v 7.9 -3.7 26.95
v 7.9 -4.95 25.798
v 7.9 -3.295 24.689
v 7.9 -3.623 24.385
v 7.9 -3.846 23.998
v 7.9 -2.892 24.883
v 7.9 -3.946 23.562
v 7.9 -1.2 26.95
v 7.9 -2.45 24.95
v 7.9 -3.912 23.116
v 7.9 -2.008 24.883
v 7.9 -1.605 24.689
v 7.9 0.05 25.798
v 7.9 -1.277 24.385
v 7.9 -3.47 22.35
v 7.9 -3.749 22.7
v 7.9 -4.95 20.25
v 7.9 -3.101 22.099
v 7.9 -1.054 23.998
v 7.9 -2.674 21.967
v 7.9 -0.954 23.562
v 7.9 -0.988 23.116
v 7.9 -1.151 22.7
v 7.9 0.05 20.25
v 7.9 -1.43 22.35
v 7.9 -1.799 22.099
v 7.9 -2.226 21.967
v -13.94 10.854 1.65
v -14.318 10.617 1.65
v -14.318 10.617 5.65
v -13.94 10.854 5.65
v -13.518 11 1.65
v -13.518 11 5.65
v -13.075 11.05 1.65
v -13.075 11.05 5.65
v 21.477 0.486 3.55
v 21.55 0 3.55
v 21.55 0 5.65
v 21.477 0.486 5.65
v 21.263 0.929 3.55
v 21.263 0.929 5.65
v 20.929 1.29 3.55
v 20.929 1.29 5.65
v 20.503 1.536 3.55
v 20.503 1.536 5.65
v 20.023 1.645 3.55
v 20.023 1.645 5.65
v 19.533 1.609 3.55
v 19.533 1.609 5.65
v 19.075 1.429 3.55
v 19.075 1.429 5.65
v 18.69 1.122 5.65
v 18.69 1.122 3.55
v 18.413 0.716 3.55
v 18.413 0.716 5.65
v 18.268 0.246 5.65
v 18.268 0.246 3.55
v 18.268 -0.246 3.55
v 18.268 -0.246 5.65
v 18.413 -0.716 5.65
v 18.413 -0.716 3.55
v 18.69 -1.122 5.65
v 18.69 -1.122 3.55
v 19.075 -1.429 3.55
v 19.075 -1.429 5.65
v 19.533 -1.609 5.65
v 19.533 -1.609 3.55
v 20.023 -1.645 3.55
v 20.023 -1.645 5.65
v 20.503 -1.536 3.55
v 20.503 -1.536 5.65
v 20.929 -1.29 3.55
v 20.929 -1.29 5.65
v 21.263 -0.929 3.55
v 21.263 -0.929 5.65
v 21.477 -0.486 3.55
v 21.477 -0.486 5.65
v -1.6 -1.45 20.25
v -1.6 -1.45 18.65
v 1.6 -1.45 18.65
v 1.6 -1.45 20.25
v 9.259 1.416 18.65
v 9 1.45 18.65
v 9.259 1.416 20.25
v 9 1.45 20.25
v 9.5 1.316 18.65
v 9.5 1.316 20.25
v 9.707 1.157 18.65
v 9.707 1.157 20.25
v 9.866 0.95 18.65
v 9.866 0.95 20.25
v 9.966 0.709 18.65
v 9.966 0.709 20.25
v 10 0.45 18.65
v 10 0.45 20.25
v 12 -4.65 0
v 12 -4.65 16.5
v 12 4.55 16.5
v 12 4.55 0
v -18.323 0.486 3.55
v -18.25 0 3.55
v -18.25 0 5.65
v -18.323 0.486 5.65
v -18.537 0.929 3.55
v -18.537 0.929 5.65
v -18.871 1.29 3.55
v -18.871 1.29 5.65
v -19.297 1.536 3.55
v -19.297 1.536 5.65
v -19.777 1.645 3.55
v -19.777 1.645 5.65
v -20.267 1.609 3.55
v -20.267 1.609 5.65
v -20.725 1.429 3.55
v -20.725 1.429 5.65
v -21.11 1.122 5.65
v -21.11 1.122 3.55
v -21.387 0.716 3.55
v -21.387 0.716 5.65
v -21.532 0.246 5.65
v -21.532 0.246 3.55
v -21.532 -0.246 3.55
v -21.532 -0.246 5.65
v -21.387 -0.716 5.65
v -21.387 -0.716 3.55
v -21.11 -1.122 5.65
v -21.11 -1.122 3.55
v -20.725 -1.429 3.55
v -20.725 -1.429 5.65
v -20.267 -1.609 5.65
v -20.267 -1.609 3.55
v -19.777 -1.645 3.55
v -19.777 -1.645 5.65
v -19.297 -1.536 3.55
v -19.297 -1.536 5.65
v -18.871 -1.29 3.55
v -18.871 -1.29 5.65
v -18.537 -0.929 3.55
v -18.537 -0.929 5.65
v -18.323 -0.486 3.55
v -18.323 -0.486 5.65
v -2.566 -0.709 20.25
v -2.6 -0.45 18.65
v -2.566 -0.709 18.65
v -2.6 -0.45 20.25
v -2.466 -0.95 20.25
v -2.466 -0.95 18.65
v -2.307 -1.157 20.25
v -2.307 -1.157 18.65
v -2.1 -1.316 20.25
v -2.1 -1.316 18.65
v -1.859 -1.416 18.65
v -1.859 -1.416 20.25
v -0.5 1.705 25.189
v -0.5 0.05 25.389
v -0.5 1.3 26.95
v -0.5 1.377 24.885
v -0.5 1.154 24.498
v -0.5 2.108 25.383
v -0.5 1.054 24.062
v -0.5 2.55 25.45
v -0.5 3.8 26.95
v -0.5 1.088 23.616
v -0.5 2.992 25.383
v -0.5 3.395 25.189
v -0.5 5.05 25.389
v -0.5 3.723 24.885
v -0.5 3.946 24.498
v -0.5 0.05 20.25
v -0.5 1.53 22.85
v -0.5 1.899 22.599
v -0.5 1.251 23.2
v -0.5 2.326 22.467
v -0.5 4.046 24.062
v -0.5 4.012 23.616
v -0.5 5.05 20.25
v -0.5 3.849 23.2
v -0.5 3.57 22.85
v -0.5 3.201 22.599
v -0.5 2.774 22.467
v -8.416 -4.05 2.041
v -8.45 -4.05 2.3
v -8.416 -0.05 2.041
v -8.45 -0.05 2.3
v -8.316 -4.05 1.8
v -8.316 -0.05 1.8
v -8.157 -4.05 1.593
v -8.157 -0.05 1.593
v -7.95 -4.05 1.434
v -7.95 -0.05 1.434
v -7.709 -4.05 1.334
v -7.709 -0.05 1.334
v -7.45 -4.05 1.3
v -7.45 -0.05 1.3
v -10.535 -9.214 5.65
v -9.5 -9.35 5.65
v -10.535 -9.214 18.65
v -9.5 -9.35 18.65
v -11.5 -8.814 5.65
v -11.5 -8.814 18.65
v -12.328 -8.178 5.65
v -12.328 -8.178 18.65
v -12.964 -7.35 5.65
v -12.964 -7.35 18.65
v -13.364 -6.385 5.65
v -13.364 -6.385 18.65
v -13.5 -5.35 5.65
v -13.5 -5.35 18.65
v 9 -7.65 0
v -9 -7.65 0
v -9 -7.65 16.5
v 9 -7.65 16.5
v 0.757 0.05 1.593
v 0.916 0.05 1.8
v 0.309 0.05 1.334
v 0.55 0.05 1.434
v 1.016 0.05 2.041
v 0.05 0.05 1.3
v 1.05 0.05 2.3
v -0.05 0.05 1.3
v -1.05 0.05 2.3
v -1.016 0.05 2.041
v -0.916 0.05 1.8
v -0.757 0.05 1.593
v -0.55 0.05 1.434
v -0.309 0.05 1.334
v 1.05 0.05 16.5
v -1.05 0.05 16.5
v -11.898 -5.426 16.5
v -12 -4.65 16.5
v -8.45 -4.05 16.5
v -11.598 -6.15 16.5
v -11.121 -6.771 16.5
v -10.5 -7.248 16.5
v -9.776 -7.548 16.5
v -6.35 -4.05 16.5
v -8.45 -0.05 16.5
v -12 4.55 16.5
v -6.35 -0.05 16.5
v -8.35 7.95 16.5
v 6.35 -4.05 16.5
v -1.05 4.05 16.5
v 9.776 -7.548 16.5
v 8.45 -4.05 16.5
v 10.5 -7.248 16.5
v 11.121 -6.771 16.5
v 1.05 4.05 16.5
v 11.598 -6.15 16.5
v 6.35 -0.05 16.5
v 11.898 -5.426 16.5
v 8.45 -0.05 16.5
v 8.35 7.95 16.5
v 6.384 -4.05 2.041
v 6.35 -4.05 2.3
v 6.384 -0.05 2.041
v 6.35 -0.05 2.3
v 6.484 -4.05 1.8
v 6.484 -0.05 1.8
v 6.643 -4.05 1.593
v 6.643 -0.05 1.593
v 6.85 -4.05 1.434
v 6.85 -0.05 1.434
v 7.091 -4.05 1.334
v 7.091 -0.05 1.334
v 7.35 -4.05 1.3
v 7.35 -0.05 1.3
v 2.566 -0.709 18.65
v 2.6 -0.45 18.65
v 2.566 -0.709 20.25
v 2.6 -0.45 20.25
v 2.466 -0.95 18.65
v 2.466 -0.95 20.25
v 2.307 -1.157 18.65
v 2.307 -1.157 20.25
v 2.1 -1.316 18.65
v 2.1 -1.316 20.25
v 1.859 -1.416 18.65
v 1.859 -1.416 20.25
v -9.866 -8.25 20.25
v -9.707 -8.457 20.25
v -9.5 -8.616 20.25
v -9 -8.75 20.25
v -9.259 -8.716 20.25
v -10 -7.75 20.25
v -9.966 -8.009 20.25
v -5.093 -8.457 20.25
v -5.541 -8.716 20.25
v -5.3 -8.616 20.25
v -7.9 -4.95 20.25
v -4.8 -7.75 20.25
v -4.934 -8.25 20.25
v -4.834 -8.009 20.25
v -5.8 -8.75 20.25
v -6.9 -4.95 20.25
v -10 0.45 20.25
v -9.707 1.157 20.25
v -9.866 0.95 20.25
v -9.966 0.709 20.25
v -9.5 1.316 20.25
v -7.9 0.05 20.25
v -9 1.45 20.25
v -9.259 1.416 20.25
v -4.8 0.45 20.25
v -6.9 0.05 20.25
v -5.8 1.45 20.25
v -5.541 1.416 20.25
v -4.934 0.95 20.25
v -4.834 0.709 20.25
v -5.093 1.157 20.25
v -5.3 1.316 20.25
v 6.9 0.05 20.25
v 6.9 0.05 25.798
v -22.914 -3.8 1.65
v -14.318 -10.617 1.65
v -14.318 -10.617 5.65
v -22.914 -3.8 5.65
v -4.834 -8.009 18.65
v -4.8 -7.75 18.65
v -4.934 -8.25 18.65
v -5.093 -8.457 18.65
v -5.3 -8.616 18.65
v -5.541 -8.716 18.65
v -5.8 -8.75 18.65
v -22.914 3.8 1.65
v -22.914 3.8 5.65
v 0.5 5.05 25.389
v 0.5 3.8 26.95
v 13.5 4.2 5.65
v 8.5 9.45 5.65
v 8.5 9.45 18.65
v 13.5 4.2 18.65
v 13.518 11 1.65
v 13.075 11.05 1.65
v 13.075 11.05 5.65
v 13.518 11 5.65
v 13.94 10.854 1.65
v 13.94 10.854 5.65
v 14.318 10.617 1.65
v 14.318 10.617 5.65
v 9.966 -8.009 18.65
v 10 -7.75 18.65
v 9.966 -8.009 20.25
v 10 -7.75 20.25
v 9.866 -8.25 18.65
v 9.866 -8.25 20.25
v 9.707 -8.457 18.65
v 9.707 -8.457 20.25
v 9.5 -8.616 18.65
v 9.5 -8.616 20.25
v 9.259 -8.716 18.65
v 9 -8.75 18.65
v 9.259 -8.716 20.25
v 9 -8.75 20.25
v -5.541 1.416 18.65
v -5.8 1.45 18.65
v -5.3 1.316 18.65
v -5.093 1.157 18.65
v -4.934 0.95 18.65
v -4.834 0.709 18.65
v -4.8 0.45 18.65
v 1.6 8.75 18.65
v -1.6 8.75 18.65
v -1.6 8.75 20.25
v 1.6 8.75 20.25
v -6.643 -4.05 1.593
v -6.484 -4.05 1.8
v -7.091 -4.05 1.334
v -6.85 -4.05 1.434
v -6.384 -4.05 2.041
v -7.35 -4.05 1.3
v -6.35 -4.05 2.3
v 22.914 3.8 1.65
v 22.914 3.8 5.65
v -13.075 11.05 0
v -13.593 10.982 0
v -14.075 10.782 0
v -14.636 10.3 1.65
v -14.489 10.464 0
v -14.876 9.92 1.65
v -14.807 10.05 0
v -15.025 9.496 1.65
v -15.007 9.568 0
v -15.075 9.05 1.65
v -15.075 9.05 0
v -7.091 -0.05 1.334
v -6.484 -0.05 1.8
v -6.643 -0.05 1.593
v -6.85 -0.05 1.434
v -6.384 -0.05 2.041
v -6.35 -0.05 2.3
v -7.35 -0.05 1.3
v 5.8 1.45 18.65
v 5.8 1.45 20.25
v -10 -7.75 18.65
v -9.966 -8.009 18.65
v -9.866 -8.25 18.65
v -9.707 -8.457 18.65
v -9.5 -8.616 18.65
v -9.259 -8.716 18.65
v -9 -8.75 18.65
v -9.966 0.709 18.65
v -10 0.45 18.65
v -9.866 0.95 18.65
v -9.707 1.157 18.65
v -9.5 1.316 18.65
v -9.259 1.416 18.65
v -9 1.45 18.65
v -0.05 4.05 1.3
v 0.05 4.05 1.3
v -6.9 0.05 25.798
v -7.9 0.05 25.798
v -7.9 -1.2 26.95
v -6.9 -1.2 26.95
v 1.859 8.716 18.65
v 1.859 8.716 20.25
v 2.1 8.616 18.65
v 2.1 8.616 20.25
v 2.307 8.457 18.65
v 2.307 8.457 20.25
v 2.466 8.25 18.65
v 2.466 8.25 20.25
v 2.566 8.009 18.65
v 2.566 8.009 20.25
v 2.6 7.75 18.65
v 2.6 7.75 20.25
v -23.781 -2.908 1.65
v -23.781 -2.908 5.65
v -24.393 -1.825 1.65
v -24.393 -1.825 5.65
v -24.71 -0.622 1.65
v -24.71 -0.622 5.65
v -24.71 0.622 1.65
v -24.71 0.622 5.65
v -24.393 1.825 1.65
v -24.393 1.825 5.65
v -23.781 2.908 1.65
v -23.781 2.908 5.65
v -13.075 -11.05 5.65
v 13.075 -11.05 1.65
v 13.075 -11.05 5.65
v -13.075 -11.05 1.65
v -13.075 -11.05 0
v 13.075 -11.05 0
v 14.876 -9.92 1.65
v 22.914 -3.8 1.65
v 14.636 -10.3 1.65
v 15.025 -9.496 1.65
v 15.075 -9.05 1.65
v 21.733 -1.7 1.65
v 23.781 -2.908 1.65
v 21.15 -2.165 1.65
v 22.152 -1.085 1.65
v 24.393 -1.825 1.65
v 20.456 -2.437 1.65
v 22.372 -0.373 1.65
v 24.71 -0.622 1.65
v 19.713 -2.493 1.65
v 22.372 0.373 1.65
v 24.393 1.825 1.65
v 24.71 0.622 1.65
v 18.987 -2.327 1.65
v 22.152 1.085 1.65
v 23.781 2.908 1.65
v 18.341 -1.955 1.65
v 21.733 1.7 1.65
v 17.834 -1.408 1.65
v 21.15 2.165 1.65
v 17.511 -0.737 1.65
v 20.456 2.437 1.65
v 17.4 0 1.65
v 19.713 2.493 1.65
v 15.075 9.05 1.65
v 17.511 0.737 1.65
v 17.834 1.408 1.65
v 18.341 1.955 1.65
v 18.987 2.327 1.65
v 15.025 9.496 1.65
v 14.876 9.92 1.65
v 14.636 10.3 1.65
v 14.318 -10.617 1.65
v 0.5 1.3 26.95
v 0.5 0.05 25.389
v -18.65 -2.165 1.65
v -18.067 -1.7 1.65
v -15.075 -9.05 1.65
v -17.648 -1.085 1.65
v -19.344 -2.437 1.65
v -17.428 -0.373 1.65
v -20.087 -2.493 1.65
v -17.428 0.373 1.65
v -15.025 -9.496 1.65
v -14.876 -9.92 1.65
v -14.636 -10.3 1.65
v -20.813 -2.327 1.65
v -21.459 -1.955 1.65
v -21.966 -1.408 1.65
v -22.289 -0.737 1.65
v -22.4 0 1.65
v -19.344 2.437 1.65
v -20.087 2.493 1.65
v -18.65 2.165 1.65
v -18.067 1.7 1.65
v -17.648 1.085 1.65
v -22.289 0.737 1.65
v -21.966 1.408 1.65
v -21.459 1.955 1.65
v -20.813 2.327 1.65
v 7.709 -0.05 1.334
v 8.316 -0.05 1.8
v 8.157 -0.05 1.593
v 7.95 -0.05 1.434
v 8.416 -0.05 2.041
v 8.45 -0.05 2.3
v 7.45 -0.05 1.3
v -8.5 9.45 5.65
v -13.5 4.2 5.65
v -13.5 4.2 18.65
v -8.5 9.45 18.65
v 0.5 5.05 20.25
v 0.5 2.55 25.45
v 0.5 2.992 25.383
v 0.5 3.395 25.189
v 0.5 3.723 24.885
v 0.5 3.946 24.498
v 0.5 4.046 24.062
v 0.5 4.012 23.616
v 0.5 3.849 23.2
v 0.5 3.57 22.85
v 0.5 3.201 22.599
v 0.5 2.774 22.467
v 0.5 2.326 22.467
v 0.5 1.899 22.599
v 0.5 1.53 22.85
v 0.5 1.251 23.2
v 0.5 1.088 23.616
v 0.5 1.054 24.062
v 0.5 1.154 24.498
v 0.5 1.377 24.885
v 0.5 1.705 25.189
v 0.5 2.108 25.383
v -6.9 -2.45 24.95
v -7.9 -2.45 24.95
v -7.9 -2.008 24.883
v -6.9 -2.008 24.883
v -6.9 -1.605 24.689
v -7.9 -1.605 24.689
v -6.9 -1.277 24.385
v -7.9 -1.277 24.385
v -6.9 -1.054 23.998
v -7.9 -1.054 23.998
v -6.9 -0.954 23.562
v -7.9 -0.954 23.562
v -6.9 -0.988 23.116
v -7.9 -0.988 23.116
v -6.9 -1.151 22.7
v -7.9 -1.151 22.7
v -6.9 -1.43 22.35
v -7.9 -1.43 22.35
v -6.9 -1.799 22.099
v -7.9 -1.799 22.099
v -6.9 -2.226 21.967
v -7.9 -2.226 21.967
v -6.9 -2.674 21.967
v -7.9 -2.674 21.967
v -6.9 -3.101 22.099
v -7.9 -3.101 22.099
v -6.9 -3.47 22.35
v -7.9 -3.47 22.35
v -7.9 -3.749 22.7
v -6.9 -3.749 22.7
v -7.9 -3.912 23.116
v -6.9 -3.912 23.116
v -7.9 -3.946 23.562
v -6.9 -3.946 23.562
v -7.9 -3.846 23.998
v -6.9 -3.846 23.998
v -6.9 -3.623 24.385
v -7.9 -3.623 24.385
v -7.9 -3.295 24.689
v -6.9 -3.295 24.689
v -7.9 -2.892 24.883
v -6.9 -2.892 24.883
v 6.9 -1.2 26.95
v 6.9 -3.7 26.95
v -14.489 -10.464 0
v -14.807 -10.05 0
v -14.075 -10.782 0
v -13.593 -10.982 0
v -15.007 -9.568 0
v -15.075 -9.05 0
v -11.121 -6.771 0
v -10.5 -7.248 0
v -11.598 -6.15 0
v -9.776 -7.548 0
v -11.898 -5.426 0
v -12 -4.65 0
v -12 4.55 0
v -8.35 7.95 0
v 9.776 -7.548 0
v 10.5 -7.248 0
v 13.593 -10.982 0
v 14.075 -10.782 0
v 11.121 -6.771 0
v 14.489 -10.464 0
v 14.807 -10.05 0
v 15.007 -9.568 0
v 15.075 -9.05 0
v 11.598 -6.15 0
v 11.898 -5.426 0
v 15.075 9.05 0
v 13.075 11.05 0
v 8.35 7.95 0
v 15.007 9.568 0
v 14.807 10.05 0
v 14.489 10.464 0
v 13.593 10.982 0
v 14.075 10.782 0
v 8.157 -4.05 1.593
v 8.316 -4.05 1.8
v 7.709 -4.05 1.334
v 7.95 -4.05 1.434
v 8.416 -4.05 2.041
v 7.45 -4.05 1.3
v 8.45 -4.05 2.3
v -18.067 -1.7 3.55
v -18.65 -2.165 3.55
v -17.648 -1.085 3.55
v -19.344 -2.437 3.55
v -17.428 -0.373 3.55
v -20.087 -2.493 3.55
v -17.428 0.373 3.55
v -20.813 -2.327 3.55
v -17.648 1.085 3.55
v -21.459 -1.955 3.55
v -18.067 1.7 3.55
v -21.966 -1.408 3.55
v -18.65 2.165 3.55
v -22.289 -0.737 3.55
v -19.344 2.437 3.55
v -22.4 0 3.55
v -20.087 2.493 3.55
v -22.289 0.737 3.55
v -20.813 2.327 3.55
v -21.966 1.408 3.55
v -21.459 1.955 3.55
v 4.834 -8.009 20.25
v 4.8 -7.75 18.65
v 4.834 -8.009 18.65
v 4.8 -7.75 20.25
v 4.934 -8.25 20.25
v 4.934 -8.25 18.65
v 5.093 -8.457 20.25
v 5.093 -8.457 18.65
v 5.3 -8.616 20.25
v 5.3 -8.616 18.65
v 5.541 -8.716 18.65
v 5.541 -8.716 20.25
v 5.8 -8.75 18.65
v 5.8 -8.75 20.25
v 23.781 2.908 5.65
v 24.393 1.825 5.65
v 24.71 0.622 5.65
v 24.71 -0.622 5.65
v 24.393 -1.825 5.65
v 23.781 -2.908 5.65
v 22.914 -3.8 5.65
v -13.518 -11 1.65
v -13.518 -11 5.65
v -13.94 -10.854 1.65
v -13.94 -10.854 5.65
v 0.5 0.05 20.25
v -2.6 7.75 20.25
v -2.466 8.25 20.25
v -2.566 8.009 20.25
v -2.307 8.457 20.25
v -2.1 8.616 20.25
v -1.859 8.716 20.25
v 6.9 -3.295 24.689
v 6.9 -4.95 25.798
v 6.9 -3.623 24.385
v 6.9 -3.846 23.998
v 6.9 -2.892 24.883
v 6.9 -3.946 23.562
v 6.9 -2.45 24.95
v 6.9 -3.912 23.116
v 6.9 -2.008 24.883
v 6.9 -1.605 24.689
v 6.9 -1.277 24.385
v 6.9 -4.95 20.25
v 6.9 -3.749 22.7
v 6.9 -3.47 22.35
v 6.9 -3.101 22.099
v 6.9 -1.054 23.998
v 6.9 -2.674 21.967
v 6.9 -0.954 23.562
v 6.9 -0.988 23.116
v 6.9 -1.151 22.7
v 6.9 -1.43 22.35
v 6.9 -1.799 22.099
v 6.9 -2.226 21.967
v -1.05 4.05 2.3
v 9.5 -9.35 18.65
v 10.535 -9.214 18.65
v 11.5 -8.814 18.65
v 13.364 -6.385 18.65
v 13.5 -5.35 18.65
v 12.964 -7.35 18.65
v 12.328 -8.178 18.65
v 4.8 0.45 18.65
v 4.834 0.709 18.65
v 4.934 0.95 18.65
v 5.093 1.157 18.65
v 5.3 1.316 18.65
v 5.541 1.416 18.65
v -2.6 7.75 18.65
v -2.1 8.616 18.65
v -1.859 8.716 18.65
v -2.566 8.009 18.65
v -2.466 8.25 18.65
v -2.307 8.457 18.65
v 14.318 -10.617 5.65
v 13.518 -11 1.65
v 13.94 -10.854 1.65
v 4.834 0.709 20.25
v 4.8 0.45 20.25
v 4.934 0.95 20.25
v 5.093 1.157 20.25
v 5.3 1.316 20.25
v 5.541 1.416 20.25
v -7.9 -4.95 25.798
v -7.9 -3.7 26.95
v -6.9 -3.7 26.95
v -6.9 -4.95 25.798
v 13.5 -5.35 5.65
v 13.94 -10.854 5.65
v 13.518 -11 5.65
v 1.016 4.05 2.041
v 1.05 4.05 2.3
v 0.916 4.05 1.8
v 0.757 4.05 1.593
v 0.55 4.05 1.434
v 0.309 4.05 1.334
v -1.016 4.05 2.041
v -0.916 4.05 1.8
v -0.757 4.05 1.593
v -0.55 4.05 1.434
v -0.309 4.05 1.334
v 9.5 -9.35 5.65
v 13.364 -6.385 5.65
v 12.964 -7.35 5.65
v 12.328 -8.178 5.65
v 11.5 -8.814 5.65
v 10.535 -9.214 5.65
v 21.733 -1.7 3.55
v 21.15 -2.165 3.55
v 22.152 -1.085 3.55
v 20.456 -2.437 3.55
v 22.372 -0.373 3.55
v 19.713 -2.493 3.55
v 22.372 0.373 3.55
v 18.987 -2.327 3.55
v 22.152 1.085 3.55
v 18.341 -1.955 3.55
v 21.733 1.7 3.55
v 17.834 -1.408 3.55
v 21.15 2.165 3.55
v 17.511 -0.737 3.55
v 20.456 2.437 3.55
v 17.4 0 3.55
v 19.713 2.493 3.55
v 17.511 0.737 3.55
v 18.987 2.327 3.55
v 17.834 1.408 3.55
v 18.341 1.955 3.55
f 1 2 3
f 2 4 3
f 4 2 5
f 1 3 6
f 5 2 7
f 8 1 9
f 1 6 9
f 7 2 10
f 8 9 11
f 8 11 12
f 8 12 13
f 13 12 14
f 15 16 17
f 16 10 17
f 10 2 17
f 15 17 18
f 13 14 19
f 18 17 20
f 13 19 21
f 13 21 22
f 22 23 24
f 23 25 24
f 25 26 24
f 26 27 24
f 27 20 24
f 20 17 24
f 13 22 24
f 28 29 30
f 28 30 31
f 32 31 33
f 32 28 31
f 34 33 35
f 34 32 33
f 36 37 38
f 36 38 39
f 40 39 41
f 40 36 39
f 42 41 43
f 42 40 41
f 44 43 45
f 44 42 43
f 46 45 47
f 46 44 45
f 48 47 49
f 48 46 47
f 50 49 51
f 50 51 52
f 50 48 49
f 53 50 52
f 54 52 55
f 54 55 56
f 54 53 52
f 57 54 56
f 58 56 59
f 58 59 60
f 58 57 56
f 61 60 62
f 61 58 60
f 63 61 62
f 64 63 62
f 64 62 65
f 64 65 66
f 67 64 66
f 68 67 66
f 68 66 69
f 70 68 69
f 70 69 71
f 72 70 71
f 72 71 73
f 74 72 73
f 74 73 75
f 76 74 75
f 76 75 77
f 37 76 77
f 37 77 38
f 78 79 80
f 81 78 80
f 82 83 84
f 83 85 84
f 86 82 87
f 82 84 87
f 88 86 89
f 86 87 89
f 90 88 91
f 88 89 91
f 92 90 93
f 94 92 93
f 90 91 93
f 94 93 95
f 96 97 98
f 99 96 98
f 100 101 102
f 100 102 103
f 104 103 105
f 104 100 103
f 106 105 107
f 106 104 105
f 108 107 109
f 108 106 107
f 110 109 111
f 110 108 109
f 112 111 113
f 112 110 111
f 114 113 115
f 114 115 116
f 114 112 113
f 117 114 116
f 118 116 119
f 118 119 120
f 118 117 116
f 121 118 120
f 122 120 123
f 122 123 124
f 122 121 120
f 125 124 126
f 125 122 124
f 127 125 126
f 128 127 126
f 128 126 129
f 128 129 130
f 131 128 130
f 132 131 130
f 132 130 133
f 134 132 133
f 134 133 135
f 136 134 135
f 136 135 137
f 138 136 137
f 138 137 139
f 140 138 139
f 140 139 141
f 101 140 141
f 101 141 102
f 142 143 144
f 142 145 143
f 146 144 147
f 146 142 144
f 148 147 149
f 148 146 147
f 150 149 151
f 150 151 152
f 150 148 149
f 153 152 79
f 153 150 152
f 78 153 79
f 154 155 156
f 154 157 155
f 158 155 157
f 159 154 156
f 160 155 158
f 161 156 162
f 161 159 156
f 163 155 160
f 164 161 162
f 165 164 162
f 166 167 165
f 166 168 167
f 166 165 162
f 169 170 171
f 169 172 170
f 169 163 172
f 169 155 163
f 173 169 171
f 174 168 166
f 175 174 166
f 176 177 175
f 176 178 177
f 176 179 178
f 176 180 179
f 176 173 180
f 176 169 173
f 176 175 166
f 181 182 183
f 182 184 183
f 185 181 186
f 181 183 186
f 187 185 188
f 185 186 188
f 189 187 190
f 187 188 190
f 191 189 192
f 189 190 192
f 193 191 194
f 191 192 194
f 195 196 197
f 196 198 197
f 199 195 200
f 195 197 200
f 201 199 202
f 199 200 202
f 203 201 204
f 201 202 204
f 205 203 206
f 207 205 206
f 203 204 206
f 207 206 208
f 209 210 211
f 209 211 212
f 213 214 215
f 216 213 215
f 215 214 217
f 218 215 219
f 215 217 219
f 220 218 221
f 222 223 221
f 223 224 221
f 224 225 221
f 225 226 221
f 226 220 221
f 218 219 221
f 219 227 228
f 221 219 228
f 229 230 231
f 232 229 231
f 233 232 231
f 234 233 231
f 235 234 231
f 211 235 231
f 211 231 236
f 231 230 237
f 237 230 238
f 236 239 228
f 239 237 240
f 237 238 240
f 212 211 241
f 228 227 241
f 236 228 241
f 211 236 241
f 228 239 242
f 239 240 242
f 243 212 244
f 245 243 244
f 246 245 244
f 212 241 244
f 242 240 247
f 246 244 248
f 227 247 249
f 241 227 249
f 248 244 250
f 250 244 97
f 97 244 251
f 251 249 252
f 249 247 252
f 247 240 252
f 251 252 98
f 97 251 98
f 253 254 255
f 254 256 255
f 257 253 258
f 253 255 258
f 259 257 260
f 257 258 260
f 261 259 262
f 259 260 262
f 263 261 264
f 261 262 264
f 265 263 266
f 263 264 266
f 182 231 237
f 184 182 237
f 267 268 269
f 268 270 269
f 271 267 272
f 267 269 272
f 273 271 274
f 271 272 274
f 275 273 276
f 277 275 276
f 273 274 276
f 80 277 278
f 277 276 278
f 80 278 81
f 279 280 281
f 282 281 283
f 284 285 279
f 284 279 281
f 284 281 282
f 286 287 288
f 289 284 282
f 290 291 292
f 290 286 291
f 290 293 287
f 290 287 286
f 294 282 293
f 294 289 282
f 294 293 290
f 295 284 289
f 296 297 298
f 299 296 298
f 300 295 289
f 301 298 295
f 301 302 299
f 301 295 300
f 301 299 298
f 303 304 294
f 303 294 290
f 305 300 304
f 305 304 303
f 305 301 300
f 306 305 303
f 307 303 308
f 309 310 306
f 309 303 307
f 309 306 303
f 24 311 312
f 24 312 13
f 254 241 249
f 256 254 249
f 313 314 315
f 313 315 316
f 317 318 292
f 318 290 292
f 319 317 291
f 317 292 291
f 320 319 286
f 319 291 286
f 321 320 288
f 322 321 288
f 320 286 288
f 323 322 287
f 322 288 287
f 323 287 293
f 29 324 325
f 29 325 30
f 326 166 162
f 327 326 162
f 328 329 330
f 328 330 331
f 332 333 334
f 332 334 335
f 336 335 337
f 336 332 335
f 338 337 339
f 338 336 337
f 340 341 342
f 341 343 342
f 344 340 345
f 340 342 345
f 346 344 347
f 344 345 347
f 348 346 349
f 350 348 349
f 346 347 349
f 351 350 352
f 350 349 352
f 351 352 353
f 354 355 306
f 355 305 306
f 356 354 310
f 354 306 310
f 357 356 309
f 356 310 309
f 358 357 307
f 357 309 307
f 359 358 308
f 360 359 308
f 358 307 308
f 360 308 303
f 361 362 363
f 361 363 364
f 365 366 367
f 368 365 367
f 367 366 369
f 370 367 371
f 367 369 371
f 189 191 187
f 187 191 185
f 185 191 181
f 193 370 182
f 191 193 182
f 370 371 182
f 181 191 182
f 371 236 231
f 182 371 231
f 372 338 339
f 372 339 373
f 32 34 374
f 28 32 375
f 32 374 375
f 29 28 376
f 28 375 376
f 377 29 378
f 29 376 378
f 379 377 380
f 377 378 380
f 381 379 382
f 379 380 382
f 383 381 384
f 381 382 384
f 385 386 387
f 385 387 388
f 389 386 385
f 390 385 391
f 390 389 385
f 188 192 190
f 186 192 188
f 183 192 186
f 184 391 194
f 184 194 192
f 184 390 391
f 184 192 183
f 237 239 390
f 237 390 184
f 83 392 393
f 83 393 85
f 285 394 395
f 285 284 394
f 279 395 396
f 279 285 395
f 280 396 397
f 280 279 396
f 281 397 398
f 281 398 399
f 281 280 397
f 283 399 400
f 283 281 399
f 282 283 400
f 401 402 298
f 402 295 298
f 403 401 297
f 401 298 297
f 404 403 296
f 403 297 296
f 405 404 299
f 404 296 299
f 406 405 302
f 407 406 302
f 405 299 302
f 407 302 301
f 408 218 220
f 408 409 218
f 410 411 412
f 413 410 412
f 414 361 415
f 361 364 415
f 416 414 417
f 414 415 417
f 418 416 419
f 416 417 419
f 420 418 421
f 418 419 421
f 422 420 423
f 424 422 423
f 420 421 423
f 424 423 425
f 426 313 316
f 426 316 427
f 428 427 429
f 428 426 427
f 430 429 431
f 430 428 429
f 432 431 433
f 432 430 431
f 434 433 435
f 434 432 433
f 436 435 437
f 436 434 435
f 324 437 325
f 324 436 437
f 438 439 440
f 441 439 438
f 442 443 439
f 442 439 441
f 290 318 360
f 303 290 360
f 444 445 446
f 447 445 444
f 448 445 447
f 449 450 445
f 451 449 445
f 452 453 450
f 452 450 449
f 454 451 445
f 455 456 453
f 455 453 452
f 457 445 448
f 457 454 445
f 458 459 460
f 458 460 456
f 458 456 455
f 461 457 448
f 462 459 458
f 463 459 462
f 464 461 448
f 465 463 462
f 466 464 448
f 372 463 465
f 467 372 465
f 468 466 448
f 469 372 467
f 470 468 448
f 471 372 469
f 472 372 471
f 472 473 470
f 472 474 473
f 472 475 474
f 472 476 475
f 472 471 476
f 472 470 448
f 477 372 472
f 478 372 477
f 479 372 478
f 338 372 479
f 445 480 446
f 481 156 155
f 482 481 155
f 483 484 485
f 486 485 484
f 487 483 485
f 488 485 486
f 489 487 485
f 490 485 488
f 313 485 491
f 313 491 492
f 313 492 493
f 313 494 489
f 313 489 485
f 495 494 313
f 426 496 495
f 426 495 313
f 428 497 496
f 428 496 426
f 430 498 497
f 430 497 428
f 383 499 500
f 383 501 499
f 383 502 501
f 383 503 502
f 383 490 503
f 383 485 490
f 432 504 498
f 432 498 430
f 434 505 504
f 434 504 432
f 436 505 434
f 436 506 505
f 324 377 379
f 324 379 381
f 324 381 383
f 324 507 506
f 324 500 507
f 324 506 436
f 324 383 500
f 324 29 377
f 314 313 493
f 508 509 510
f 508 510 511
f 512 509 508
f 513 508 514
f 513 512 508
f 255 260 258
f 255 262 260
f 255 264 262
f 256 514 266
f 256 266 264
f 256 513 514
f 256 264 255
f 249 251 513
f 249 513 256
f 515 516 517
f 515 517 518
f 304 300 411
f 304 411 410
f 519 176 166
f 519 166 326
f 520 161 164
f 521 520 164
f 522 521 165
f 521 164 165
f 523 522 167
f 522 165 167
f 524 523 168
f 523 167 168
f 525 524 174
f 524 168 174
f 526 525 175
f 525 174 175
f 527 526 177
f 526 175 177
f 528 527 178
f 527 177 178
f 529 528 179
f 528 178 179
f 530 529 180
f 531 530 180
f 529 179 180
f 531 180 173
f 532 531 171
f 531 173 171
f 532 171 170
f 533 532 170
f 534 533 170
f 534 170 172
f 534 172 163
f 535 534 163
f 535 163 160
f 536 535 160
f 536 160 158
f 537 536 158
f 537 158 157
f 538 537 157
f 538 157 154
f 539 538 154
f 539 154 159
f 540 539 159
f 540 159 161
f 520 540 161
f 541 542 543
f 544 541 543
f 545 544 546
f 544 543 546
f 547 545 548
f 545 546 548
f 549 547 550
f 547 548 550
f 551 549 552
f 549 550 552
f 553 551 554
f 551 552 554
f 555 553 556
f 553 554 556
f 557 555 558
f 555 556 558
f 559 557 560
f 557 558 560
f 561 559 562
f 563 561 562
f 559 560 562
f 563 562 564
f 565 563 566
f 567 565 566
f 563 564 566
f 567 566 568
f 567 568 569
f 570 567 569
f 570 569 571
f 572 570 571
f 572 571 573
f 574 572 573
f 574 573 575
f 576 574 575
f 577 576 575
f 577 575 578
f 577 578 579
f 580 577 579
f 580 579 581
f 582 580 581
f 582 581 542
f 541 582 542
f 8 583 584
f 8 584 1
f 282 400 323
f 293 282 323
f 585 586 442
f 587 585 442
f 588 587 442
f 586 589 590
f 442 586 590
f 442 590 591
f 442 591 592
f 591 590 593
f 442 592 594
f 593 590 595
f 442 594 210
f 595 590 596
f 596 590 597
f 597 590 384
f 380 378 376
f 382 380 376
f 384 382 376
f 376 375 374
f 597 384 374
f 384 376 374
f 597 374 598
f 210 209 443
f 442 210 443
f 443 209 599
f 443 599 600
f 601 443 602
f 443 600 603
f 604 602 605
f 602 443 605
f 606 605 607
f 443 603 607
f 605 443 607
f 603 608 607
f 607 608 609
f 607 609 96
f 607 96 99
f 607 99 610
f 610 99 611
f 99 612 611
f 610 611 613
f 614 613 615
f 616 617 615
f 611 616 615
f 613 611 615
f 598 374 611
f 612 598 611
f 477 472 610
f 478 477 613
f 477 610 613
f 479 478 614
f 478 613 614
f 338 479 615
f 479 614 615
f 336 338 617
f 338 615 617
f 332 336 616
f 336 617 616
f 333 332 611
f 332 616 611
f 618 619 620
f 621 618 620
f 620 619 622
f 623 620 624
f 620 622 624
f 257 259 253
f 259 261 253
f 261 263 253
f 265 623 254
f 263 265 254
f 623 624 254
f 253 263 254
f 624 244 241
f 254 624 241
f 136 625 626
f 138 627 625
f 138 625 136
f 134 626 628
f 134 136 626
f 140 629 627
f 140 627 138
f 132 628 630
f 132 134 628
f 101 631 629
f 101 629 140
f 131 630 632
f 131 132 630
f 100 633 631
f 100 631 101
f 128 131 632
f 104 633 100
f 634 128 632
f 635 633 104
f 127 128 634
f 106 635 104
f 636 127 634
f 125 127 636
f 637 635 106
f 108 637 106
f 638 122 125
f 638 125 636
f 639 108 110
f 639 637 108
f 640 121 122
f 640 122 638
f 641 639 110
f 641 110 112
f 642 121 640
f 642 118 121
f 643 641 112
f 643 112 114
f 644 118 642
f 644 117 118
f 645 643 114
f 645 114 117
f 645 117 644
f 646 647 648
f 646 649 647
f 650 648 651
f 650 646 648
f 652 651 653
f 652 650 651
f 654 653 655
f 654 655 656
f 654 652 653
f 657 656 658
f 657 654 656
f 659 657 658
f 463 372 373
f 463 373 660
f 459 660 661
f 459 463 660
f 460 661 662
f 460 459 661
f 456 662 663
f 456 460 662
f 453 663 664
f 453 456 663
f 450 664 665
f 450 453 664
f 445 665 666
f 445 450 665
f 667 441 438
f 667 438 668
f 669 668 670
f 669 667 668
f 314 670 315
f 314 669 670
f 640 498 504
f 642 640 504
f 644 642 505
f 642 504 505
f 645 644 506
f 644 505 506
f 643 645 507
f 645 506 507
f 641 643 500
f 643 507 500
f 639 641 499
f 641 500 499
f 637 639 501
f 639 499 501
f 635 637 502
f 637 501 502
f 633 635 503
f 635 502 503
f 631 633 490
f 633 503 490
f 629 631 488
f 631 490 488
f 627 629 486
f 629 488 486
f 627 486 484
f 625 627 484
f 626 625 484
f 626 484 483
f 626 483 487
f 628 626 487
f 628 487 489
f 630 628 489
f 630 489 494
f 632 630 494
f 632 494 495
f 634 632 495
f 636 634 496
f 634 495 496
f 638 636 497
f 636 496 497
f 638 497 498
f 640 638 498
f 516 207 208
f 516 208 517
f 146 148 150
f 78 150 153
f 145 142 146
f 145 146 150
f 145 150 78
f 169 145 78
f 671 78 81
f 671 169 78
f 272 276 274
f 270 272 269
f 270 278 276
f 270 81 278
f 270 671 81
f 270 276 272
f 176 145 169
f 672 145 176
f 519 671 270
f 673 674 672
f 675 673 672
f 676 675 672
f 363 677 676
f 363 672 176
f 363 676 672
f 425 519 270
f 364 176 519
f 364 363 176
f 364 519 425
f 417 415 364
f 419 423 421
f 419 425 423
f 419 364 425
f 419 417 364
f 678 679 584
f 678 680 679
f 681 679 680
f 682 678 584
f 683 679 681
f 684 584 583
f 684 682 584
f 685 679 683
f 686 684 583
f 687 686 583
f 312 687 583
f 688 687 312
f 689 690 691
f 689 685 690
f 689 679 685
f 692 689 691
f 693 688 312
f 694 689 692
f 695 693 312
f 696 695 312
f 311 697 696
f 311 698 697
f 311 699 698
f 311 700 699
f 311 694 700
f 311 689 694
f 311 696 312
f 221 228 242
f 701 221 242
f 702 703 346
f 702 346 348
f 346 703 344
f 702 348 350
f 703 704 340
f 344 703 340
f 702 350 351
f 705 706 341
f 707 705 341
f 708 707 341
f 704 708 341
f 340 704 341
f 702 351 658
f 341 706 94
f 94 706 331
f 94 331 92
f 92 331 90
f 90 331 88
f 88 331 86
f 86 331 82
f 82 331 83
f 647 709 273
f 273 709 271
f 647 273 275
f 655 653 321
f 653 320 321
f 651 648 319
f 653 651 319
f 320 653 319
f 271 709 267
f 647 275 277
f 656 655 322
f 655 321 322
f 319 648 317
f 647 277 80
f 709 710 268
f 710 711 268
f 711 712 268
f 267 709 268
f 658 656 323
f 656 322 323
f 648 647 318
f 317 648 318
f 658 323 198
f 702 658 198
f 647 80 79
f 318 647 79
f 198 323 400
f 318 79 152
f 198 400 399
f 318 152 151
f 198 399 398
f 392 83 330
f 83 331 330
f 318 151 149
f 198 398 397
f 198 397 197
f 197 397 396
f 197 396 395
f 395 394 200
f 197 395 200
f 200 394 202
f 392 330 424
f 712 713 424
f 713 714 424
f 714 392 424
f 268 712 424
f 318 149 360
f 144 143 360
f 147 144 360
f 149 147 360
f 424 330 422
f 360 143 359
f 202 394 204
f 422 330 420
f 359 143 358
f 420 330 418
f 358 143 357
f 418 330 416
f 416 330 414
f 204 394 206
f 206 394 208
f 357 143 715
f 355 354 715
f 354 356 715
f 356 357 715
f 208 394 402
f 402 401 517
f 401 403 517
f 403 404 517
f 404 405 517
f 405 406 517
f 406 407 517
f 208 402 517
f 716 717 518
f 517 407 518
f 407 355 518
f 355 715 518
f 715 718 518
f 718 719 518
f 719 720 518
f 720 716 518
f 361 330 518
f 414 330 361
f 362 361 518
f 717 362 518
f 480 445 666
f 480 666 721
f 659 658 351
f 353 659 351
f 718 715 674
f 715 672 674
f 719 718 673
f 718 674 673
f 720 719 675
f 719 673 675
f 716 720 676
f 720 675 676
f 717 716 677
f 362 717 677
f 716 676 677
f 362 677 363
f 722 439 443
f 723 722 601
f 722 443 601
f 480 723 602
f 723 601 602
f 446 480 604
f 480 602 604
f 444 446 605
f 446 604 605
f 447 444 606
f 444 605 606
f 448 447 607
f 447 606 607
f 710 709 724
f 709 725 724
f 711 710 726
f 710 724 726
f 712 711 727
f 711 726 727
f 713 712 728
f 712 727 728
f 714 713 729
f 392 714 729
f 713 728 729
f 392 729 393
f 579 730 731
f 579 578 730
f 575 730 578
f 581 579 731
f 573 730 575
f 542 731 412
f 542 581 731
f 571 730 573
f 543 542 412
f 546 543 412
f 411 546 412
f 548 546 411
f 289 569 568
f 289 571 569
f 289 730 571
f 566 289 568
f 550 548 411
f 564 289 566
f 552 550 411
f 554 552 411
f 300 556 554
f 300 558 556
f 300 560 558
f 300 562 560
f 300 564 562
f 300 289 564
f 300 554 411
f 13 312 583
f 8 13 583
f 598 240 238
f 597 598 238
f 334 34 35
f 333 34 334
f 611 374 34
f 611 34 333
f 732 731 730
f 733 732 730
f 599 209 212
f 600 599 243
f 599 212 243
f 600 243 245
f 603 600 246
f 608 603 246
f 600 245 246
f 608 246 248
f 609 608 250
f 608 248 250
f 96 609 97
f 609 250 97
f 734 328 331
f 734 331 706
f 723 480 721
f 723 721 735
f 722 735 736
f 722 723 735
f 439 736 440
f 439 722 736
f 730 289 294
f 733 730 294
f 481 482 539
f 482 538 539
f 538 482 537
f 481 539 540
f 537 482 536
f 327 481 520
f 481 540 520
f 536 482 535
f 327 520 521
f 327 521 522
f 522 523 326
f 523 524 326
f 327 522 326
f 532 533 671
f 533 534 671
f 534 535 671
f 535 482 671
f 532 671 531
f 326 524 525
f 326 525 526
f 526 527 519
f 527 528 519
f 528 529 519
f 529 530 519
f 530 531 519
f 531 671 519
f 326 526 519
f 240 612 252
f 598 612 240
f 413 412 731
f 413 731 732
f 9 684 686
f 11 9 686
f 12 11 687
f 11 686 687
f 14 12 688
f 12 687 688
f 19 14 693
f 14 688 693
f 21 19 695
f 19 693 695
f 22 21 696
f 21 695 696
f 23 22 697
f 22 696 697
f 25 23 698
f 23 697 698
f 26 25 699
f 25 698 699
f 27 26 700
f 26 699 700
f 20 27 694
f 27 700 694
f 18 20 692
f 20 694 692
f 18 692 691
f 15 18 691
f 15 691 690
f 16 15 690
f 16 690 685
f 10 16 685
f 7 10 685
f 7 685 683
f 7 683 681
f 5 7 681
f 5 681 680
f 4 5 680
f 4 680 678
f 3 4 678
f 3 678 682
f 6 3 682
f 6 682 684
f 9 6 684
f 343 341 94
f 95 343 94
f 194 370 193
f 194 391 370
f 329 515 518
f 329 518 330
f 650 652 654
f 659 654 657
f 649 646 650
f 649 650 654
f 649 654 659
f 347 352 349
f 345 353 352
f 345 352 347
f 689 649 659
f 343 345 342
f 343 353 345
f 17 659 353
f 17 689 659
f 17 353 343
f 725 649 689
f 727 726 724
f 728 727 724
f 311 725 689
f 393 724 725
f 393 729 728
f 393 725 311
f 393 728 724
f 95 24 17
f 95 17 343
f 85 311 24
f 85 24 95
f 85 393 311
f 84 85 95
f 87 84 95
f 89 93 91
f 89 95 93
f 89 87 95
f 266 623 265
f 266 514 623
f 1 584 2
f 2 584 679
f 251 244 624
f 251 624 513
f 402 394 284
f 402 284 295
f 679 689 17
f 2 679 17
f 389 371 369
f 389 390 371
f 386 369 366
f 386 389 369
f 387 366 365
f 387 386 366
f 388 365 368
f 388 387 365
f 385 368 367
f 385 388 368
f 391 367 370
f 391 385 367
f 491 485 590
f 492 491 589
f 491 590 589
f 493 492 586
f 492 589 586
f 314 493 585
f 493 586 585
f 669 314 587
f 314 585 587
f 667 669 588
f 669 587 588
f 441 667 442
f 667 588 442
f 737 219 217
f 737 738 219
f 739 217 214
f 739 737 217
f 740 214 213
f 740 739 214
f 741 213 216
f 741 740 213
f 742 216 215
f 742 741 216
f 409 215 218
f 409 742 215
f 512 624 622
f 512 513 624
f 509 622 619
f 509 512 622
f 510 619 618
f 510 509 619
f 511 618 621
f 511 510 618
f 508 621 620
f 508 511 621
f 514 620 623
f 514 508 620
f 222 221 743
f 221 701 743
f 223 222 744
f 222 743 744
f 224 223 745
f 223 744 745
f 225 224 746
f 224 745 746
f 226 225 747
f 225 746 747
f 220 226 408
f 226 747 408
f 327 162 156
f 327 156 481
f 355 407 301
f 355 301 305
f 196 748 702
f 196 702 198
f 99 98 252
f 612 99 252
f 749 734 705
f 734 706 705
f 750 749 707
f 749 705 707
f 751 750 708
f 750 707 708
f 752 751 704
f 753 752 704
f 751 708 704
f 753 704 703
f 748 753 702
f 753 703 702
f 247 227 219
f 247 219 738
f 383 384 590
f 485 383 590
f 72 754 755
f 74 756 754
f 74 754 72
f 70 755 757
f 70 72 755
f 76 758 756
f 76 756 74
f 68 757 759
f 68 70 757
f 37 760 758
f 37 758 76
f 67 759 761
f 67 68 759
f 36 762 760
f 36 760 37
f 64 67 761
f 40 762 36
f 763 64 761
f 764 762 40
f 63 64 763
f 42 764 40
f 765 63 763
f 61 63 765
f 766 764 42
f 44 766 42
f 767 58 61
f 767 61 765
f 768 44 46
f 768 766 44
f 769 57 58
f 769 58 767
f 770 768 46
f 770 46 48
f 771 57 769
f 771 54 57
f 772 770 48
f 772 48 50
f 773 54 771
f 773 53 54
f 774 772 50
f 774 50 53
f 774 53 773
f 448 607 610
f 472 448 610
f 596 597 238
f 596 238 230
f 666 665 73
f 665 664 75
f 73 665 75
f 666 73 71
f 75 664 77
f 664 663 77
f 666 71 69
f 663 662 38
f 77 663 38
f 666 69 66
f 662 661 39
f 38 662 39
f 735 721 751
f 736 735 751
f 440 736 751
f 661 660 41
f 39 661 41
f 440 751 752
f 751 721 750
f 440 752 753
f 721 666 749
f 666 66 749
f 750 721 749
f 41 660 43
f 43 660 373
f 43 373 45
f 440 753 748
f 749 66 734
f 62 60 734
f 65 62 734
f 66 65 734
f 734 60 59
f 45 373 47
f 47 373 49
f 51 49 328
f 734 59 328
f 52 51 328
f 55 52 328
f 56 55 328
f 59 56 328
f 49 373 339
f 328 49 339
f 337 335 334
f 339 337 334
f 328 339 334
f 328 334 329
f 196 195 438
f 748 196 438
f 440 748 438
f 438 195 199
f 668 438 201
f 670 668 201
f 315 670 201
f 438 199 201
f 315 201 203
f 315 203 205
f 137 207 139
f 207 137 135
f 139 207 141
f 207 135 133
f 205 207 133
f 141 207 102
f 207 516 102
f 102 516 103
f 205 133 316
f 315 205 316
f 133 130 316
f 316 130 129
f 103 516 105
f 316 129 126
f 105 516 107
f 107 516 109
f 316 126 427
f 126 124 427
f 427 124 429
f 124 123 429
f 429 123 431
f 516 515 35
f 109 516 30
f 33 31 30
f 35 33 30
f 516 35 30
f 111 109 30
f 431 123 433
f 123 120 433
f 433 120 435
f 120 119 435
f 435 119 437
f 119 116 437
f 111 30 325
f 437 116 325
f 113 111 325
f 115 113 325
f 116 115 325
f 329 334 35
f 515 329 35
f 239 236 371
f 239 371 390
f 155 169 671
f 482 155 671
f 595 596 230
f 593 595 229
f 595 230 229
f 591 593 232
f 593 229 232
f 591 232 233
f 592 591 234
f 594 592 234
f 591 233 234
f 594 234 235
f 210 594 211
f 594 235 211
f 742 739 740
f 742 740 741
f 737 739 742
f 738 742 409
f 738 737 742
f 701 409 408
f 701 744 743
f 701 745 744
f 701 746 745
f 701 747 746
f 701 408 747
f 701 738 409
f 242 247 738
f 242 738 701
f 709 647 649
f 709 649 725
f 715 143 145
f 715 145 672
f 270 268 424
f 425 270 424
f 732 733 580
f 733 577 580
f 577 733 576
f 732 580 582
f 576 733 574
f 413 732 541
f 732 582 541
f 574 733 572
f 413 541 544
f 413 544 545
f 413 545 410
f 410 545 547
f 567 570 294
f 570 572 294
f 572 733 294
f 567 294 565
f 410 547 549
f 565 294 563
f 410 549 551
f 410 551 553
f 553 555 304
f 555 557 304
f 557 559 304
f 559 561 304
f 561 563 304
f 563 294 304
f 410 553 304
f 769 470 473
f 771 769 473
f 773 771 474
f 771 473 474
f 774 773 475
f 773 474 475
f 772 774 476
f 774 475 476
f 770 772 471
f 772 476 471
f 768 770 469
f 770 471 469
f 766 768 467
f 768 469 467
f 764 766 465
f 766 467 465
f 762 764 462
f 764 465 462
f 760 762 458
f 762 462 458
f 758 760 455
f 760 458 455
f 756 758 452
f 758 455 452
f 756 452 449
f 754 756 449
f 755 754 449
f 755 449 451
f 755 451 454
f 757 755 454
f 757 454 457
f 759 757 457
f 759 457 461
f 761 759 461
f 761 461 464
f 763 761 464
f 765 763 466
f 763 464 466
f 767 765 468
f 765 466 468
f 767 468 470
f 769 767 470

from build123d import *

# Parameters (mm, degrees)
BOSS_EXTRUDE1_DEPTH = 1.65
SKETCH2_R           = 1.650000009
BOSS_EXTRUDE2_DEPTH = 4
BOSS_EXTRUDE3_DEPTH = 13
CUT_EXTRUDE1_DEPTH  = 16.5
FILLET1_R           = 4
FILLET2_R           = 3
SKETCH5_R           = 2.5
CUT_EXTRUDE2_DEPTH  = 1.9
SKETCH6_W           = 5.2
SKETCH6_H           = 10.2
BOSS_EXTRUDE4_DEPTH = 1.6
FILLET3_R           = 1
SKETCH7_W           = 2.1
SKETCH7_H           = 4
BOSS_EXTRUDE5_DEPTH = 15.2
FILLET4_R           = 1
SKETCH8_W           = 1
SKETCH8_H           = 5
BOSS_EXTRUDE6_DEPTH = 6.7
SKETCH9_R           = 1.5
CUT_EXTRUDE3_DEPTH  = 44.75417123
CUT_EXTRUDE4_REACH  = 40.548
SKETCH10_R          = 1.5


with BuildPart() as part:
    # Sketch1 → Boss-Extrude1 (new body)
    with BuildSketch(Plane.XY):
        with BuildLine():
            Line((-13.075, -11.05), (13.075, -11.05))
            ThreePointArc((13.075, -11.05), (14.489213562, -10.464213562), (15.075, -9.05))
            Line((15.075, -9.05), (15.075, 9.05))
            ThreePointArc((15.075, 9.05), (14.489213562, 10.464213562), (13.075, 11.05))
            Line((13.075, 11.05), (-13.075, 11.05))
            ThreePointArc((-13.075, 11.05), (-14.489213562, 10.464213562), (-15.075, 9.05))
            Line((-15.075, 9.05), (-15.075, -9.05))
            ThreePointArc((-15.075, -9.05), (-14.489213562, -10.464213562), (-13.075, -11.05))
        make_face()
    extrude(amount=BOSS_EXTRUDE1_DEPTH)

    # Sketch2 → Boss-Extrude2 (add)
    with BuildSketch(Plane.XY.offset(1.65)):
        with BuildLine():
            Line((14.317737301, 10.617036694), (22.913637955, 3.800063983))
            ThreePointArc((22.913637955, 3.800063983), (24.75, 0), (22.913637955, -3.800063983))
            Line((22.913637955, -3.800063983), (14.317737301, -10.617036694))
            ThreePointArc((14.317737301, -10.617036694), (13.732999473, -10.938660026), (13.075, -11.05))
            Line((13.075, -11.05), (-13.075, -11.05))
            ThreePointArc((-13.075, -11.05), (-13.732999473, -10.938660026), (-14.317737301, -10.617036694))
            Line((-14.317737301, -10.617036694), (-22.913637955, -3.800063983))
            ThreePointArc((-22.913637955, -3.800063983), (-24.75, 0), (-22.913637955, 3.800063983))
            Line((-22.913637955, 3.800063983), (-14.317737301, 10.617036694))
            ThreePointArc((-14.317737301, 10.617036694), (-13.732999473, 10.938660026), (-13.075, 11.05))
            Line((-13.075, 11.05), (13.075, 11.05))
            ThreePointArc((13.075, 11.05), (13.732999473, 10.938660026), (14.317737301, 10.617036694))
        make_face()
        with Locations((19.9, 0)):
            Circle(SKETCH2_R, mode=Mode.SUBTRACT)
        with Locations((-19.9, 0)):
            Circle(SKETCH2_R, mode=Mode.SUBTRACT)
    extrude(amount=BOSS_EXTRUDE2_DEPTH)

    # Sketch3 → Boss-Extrude3 (add)
    with BuildSketch(Plane.XY.offset(5.65)):
        Polygon((-8.5, 9.45), (8.5, 9.45), (13.5, 4.2), (13.5, -9.35), (-13.5, -9.35), (-13.5, 4.2), align=None)
    extrude(amount=BOSS_EXTRUDE3_DEPTH)

    # Sketch4 → Cut-Extrude1 (cut)
    with BuildSketch(Plane(origin=(0, 0, 0), x_dir=(-1, 0, 0), z_dir=(0, 0, -1))):
        Polygon((-8.35, 7.95), (8.35, 7.95), (12, 4.55), (12, -7.65), (-12, -7.65), (-12, 4.55), align=None)
    extrude(amount=-CUT_EXTRUDE1_DEPTH, mode=Mode.SUBTRACT)

    # Fillet1
    fillet1_edges = [part.edges().sort_by_distance(p)[0] for p in [
        (-13.5, -9.35, 12.15),
        (13.5, -9.35, 12.15),
    ]]
    fillet(fillet1_edges, radius=FILLET1_R)

    # Fillet2
    fillet2_edges = [part.edges().sort_by_distance(p)[0] for p in [
        (-12, -7.65, 8.25),
        (12, -7.65, 8.25),
    ]]
    fillet(fillet2_edges, radius=FILLET2_R)

    # Sketch5 → Cut-Extrude2 (cut)
    with BuildSketch(Plane(origin=(0, 0, 1.65), x_dir=(-1, 0, 0), z_dir=(0, 0, -1))):
        with Locations((-19.9, 0)):
            Circle(SKETCH5_R)
        with Locations((19.9, 0)):
            Circle(SKETCH5_R)
    extrude(amount=-CUT_EXTRUDE2_DEPTH, mode=Mode.SUBTRACT)

    # Sketch6 → Boss-Extrude4 (add)
    with BuildSketch(Plane.XY.offset(18.65)):
        with Locations((0, 3.65)):
            Rectangle(SKETCH6_W, SKETCH6_H)
        with Locations((7.4, -3.65)):
            Rectangle(SKETCH6_W, SKETCH6_H)
        with Locations((-7.4, -3.65)):
            Rectangle(SKETCH6_W, SKETCH6_H)
    extrude(amount=BOSS_EXTRUDE4_DEPTH)

    # Fillet3
    fillet3_edges = [part.edges().sort_by_distance(p)[0] for p in [
        (-2.6, 8.75, 19.45),
        (-2.6, -1.45, 19.45),
        (2.6, -1.45, 19.45),
        (2.6, 8.75, 19.45),
        (4.8, 1.45, 19.45),
        (4.8, -8.75, 19.45),
        (10, -8.75, 19.45),
        (10, 1.45, 19.45),
        (-10, 1.45, 19.45),
        (-10, -8.75, 19.45),
        (-4.8, -8.75, 19.45),
        (-4.8, 1.45, 19.45),
    ]]
    fillet(fillet3_edges, radius=FILLET3_R)

    # Sketch7 → Boss-Extrude5 (add)
    with BuildSketch(Plane(origin=(0, 0, 16.5), x_dir=(-1, 0, 0), z_dir=(0, 0, -1))):
        with Locations((0, 2.05)):
            Rectangle(SKETCH7_W, SKETCH7_H)
        with Locations((-7.4, -2.05)):
            Rectangle(SKETCH7_W, SKETCH7_H)
        with Locations((7.4, -2.05)):
            Rectangle(SKETCH7_W, SKETCH7_H)
    extrude(amount=BOSS_EXTRUDE5_DEPTH)

    # Fillet4
    fillet4_edges = [part.edges().sort_by_distance(p)[0] for p in [
        (1.05, 2.05, 1.3),
        (-1.05, 2.05, 1.3),
        (8.45, -2.05, 1.3),
        (6.35, -2.05, 1.3),
        (-6.35, -2.05, 1.3),
        (-8.45, -2.05, 1.3),
    ]]
    fillet(fillet4_edges, radius=FILLET4_R)

    # Sketch8 → Boss-Extrude6 (add)
    with BuildSketch(Plane.XY.offset(20.25)):
        with Locations((-7.4, -2.45)):
            Rectangle(SKETCH8_W, SKETCH8_H)
        with Locations((0, 2.55)):
            Rectangle(SKETCH8_W, SKETCH8_H)
        with Locations((7.4, -2.45)):
            Rectangle(SKETCH8_W, SKETCH8_H)
    extrude(amount=BOSS_EXTRUDE6_DEPTH)

    # Sketch9 → Cut-Extrude3 (cut, through all)
    with BuildSketch(Plane.ZY.offset(7.9)):
        with Locations((23.45, -2.45)):
            Circle(SKETCH9_R)
        Polygon((25.797828138, 0.05), (26.95, -1.2), (26.95, 0.05), align=None)
        Polygon((26.95, -3.7), (25.797828138, -4.95), (26.95, -4.95), align=None)
    extrude(amount=-CUT_EXTRUDE3_DEPTH, mode=Mode.SUBTRACT)

    # Sketch10 → Cut-Extrude4 (cut, up to next)
    with BuildSketch(Plane.ZY.offset(0.5), mode=Mode.PRIVATE) as cut_extrude4_sk1:
        with Locations((23.95, 2.55)):
            Circle(SKETCH10_R)
    cut_extrude4_tool1 = extrude(cut_extrude4_sk1.sketch, amount=-CUT_EXTRUDE4_REACH, mode=Mode.PRIVATE) & part.part
    # Sketch10 → Cut-Extrude4 (cut, up to next)
    with BuildSketch(Plane.ZY.offset(0.5), mode=Mode.PRIVATE) as cut_extrude4_sk2:
        Polygon((25.3887505, 5.05), (26.95, 3.8), (26.95, 5.05), align=None)
    cut_extrude4_tool2 = extrude(cut_extrude4_sk2.sketch, amount=-CUT_EXTRUDE4_REACH, mode=Mode.PRIVATE) & part.part
    # Sketch10 → Cut-Extrude4 (cut, up to next)
    with BuildSketch(Plane.ZY.offset(0.5), mode=Mode.PRIVATE) as cut_extrude4_sk3:
        Polygon((26.95, 1.3), (25.3887505, 0.05), (26.95, 0.05), align=None)
    cut_extrude4_tool3 = extrude(cut_extrude4_sk3.sketch, amount=-CUT_EXTRUDE4_REACH, mode=Mode.PRIVATE) & part.part
    add(cut_extrude4_tool1.solids().sort_by_distance((-0.5, 2.55, 23.95))[0], mode=Mode.SUBTRACT)
    add(cut_extrude4_tool2.solids().sort_by_distance((-0.5, 4.633333, 26.429584))[0], mode=Mode.SUBTRACT)
    add(cut_extrude4_tool3.solids().sort_by_distance((-0.5, 0.466667, 26.429584))[0], mode=Mode.SUBTRACT)


solid = part.part
